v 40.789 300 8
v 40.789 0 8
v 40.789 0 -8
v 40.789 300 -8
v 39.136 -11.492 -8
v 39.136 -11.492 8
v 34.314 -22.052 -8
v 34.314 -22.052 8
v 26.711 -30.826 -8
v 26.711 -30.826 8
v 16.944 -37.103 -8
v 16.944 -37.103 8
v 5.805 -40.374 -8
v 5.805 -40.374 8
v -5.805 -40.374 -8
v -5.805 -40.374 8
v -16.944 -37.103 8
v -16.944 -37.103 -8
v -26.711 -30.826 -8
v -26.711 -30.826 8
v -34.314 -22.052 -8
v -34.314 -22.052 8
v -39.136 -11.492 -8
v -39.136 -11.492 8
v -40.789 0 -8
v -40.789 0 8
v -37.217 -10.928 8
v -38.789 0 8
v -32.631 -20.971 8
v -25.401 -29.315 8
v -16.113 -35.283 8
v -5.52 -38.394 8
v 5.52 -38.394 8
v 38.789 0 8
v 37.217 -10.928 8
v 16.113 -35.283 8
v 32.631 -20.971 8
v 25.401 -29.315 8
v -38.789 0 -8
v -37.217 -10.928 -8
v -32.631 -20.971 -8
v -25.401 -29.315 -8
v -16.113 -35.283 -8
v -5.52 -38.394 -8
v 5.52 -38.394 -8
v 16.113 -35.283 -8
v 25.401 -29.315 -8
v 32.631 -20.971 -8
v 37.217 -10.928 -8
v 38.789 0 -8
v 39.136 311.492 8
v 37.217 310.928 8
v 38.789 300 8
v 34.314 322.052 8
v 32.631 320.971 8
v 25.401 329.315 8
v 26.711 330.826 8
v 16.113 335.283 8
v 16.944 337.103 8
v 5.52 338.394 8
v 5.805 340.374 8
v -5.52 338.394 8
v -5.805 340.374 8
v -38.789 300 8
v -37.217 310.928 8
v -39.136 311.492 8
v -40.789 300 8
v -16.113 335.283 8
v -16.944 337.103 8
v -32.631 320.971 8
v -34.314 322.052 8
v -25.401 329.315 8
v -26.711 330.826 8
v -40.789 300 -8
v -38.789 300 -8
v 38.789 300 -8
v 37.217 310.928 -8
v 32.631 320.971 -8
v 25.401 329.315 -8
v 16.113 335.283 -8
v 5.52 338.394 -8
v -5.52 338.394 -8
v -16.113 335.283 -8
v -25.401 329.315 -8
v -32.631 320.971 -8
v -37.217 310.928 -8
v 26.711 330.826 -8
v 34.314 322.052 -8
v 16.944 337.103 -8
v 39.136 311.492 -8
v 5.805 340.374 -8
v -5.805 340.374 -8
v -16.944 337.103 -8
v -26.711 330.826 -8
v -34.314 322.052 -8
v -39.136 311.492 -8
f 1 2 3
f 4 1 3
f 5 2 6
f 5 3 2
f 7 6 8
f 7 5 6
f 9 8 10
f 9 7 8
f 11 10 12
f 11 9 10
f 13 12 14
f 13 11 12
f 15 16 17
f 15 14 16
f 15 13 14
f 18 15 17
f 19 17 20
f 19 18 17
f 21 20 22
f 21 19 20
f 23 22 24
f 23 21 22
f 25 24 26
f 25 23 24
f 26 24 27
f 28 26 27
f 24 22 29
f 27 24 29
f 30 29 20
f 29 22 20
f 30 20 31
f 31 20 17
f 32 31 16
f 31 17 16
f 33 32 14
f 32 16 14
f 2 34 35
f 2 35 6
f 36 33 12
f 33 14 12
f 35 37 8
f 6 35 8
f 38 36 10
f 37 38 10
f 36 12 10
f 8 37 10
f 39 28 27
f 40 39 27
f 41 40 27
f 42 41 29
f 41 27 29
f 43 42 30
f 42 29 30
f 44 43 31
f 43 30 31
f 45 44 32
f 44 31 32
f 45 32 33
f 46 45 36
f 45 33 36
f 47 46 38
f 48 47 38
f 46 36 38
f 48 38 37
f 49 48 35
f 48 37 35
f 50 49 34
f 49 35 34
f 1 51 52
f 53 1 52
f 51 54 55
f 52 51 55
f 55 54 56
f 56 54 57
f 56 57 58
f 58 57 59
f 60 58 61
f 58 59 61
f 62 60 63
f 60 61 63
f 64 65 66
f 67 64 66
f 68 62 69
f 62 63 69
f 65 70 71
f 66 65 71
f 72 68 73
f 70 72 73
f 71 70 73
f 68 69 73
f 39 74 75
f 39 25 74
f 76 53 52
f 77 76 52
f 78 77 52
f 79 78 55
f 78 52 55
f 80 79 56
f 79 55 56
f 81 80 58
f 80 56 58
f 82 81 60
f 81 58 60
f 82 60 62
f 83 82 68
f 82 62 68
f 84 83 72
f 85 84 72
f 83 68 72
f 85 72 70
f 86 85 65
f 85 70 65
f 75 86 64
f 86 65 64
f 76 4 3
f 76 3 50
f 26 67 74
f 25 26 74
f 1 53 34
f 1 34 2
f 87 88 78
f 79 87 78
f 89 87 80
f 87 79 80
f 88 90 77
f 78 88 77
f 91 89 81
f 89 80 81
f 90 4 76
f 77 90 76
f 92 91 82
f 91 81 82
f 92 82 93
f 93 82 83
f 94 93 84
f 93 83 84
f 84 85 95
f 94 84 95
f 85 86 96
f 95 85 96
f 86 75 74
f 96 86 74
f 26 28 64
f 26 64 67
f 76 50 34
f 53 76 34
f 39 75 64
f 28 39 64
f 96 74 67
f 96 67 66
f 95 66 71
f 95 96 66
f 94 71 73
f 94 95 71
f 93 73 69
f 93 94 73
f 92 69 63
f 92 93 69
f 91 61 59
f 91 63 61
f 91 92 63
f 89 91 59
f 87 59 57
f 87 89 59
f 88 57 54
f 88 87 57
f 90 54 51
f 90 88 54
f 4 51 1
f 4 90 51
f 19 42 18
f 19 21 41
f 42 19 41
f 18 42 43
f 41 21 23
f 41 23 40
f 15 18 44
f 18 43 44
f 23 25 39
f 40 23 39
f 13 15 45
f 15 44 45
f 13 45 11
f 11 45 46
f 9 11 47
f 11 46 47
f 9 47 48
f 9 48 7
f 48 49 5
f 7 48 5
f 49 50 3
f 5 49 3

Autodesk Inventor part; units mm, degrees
sketch "Caminho de Esboço" plane through (0, 0, 0) normal (0, 0, 1) x (1, 0, 0)
  arc A0 (-39.7887, 0) -> (39.7887, 0) centre (0, 0) ccw
  arc A1 (39.7887, 300) -> (-39.7887, 300) centre (0, 300) ccw
  line L0 (39.7887, 300) -> (39.7887, 0)
  line L1 (-39.7887, 0) -> (-39.7887, 300)
ref_plane "Plano de corte transversal" through (39.7887, 0, 0) normal (0, 1, 0) x (0, 0, 1)
ref_plane "Plano de trabalho2" through (0, 0, 0) normal (-1, 0, 0) x (0, 0, 1)
ref_plane "Plano de trabalho3" through (0, 300, 0) normal (-0.0628, -0.998, 0) x (0, 0, 1)
sketch "Seção transversal" plane through (39.7887, 0, 0) normal (0, 1, 0) x (0, 0, 1)
  line L0 (-8, 1) -> (8, 1)
  line L1 (8, 1) -> (8, -1)
  line L2 (8, -1) -> (-8, -1)
  line L3 (-8, -1) -> (-8, 1)
  line L4 (-8, 0) -> (8, 0) construction
  point P0 (0, 0)
  point P1 (0, 0)
  dimension "d0" = 16
  dimension "d4" = 1
  dimension "d5" = 1
sweep "Correia" add profiles "Seção transversal" path "Caminho de Esboço"
equation "\"d0\" = da_B"
equation "\"d4\" = da_a"
equation "\"d5\" = da_a2"
equation "\"da_B\" = 16"
equation "\"da_a\" = 1"
equation "\"da_S\" = 5.3"
equation "\"da_Beta\" = 20deg"
equation "\"da_Ht\" = 2.5"
equation "\"da_H\" = 4.5"
equation "\"da_a2\" = 1"
properties part number "Correia síncrona" material "Rubber"
